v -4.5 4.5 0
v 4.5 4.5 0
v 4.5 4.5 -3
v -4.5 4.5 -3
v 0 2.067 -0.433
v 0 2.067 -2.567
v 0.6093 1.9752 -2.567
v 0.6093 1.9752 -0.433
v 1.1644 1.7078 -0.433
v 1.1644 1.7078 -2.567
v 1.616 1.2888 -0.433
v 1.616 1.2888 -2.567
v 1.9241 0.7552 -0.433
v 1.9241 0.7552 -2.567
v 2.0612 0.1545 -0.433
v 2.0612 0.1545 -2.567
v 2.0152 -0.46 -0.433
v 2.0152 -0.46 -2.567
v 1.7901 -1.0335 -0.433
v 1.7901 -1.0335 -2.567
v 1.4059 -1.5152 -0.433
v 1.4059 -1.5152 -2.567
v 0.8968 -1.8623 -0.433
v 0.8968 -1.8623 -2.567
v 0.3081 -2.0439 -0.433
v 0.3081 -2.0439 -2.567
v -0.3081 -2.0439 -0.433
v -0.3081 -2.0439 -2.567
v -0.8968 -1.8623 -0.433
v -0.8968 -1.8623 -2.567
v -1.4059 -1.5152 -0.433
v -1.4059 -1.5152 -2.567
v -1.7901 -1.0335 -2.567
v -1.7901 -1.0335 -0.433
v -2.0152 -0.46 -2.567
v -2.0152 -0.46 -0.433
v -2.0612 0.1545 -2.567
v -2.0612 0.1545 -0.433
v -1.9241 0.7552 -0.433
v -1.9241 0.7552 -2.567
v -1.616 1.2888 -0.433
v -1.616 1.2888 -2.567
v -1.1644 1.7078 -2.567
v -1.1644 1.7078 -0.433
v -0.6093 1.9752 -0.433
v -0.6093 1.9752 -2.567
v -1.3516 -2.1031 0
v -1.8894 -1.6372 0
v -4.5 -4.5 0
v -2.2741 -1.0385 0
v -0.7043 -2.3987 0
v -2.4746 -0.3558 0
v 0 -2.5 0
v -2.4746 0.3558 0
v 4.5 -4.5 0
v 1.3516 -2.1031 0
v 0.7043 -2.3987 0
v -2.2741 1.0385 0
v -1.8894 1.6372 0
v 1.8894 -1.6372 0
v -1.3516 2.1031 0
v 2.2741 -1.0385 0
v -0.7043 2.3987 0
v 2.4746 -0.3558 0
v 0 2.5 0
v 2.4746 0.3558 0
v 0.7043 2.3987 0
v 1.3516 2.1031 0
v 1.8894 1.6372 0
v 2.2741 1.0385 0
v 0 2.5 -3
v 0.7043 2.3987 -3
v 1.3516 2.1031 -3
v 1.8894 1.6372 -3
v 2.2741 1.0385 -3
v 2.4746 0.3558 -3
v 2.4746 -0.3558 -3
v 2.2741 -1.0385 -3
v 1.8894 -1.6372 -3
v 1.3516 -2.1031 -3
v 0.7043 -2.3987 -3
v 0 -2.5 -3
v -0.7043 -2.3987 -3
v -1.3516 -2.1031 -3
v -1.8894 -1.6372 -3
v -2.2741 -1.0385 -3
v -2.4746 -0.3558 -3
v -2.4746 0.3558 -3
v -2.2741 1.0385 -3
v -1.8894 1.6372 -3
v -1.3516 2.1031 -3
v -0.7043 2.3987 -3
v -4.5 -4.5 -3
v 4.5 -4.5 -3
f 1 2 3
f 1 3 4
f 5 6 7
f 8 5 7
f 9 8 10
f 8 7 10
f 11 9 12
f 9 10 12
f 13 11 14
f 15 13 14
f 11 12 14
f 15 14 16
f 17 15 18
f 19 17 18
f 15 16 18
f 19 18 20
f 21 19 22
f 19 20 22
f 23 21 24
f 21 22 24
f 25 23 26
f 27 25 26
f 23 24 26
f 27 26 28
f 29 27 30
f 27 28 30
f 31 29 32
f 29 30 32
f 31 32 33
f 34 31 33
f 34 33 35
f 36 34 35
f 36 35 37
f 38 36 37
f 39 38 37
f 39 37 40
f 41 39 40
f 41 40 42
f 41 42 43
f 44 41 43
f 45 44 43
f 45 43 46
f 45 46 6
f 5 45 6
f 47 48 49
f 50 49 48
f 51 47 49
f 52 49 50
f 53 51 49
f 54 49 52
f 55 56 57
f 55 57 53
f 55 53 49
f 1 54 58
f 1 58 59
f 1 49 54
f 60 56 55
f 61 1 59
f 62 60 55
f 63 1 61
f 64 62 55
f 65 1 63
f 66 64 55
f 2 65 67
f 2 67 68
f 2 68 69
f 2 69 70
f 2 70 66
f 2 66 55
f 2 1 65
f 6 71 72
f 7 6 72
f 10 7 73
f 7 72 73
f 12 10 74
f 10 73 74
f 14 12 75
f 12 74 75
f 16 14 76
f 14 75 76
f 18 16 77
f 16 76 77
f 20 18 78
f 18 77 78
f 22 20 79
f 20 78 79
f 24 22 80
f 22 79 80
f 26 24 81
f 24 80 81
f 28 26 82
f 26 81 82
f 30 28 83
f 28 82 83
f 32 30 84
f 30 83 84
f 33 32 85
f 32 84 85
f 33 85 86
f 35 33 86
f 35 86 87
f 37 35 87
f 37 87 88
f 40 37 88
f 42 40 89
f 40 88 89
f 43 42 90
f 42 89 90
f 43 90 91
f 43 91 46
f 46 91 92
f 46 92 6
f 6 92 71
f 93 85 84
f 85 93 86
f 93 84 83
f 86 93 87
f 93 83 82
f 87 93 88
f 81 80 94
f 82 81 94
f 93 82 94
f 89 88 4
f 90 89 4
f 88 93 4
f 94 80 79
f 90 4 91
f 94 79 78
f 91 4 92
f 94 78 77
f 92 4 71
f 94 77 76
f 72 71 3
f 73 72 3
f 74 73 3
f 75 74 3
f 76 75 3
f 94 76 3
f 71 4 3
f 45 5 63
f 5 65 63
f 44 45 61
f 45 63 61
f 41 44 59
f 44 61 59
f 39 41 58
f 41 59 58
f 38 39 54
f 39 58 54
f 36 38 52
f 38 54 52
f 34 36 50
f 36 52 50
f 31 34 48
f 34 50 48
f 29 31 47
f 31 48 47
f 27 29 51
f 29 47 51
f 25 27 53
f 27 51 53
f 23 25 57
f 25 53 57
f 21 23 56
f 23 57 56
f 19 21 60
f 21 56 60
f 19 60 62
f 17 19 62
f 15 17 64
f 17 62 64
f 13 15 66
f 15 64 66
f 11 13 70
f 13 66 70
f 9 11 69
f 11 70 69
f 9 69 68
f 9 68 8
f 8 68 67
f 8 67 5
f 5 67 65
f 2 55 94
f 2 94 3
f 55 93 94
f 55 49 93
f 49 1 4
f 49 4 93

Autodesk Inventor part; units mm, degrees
sketch "Sketch_1" plane through (0, 0, 0) normal (0, 0, 1) x (1, 0, 0)
  line L0 (-4.5, 4.5) -> (-4.5, -4.5)
  line L1 (-4.5, -4.5) -> (4.5, -4.5)
  line L2 (4.5, -4.5) -> (4.5, 4.5)
  line L3 (4.5, 4.5) -> (-4.5, 4.5)
extrude "Extrusion1" add sketch "Sketch_1" against normal blind 3
sketch "Sketch_2" plane through (0, 0, 0) normal (1, 0, 0) x (0, 1, 0)
  line L0 (0, -3) -> (0, 0)
  line L1 (0, 0) -> (2.5, 0)
  line L2 (2.5, 0) -> (2.067, -0.433)
  line L3 (2.067, -0.433) -> (2.067, -2.567)
  line L4 (2.067, -2.567) -> (2.5, -3)
  line L5 (2.5, -3) -> (0, -3)
  line L6 (0, -3) -> (0, 0)
revolve "Revolution1" cut sketch "Sketch_2" angle 360 about axis through (0, 0, -3) along (0, 0, -1)
thread "Thread1" size "M5x0.8" class "6H" standard "ISO Metric profile" full length
ref_plane "1_XY" through (0, 0, 0) normal (0, 0, 1) x (1, 0, 0)
ref_plane "1_YZ" through (0, 0, 0) normal (1, 0, 0) x (0, 1, 0)
ref_plane "1_ZX" through (0, 0, 0) normal (0, 1, 0) x (0, 0, 1)
properties part number "14122"
